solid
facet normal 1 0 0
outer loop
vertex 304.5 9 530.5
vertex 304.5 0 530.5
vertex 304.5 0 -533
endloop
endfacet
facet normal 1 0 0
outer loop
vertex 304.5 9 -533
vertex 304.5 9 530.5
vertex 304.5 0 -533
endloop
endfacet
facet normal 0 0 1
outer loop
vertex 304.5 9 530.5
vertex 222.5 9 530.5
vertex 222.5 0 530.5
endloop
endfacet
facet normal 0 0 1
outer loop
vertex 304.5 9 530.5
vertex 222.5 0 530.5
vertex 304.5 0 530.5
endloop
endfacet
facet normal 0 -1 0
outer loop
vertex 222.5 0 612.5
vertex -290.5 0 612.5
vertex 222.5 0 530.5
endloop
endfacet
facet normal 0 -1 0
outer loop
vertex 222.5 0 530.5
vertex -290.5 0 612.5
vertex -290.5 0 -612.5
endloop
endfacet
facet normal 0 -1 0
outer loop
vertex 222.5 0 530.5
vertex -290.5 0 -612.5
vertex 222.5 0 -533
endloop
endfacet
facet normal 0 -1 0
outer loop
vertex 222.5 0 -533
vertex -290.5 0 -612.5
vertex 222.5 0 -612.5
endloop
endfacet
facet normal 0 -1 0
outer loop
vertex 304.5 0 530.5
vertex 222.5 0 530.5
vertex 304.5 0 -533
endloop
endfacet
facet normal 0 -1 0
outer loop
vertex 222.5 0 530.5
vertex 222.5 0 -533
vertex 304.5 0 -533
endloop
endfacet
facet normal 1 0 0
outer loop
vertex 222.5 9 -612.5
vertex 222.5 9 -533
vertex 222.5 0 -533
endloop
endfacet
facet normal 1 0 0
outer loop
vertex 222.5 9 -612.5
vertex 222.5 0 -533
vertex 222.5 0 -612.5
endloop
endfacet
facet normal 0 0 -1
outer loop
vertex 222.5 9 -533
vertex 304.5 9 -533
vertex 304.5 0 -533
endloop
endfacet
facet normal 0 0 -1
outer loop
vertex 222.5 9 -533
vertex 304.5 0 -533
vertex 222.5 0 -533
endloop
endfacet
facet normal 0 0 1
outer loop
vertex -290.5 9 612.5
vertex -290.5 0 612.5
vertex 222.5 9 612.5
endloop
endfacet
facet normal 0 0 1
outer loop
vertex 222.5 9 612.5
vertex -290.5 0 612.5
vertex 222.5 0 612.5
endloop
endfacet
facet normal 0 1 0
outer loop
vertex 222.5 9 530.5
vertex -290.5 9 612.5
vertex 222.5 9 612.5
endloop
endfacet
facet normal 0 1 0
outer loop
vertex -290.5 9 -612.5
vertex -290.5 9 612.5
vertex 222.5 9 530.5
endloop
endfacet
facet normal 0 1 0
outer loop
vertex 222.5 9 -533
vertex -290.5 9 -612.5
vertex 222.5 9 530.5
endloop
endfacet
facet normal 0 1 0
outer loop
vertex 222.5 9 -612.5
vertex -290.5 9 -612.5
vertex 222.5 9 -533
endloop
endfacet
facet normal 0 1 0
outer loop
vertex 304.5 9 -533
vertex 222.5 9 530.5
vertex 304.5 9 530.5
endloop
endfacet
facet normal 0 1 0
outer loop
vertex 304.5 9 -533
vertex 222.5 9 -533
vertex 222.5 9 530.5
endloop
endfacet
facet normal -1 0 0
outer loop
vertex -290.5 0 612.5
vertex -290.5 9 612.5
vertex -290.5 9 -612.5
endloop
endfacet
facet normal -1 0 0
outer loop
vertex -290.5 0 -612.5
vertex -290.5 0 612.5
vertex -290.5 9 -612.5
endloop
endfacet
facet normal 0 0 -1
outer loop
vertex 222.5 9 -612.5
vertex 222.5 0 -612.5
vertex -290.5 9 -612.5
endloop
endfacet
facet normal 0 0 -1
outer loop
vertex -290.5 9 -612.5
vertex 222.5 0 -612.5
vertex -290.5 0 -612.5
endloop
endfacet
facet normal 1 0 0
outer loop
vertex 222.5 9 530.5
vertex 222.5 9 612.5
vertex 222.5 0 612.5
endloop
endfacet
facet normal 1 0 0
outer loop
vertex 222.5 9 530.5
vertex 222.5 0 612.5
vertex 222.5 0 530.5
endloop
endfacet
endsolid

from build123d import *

# Parameters (mm, degrees)
BOSS_EXTRUDE1_DEPTH = 9
SKETCH2_W           = 14
SKETCH2_H           = 1225
CUT_EXTRUDE1_DEPTH  = 10
SKETCH3_W           = 82
SKETCH3_H           = 82
CUT_EXTRUDE2_DEPTH  = 10


with BuildPart() as part:
    # Sketch1 → Boss-Extrude1 (new body)
    with BuildSketch(Plane(origin=(0, 0, 0), x_dir=(1, 0, 0), z_dir=(0, 1, 0))):
        Polygon((-304.5, -532.5), (-304.5, -612.5), (224.5, -612.5), (304.5, -612.5), (304.5, -532.5), (304.5, 497.5), (304.5, 612.5), (224.5, 612.5), (-304.5, 612.5), (-304.5, 497.5), align=None)
    extrude(amount=BOSS_EXTRUDE1_DEPTH)

    # Sketch2 → Cut-Extrude1 (cut)
    with BuildSketch(Plane(origin=(0, 9, 0), x_dir=(1, 0, 0), z_dir=(0, 1, 0))):
        with Locations((-297.5, 0)):
            Rectangle(SKETCH2_W, SKETCH2_H)
    extrude(amount=-CUT_EXTRUDE1_DEPTH, mode=Mode.SUBTRACT)

    # Sketch3 → Cut-Extrude2 (cut)
    with BuildSketch(Plane(origin=(0, 9, 0), x_dir=(1, 0, 0), z_dir=(0, 1, 0))):
        with Locations((263.5, -571.5)):
            Rectangle(SKETCH3_W, SKETCH3_H)
        Polygon((304.5, 533), (222.5, 533), (222.5, 615), (304.5, 612.5), align=None)
    extrude(amount=-CUT_EXTRUDE2_DEPTH, mode=Mode.SUBTRACT)


solid = part.part
